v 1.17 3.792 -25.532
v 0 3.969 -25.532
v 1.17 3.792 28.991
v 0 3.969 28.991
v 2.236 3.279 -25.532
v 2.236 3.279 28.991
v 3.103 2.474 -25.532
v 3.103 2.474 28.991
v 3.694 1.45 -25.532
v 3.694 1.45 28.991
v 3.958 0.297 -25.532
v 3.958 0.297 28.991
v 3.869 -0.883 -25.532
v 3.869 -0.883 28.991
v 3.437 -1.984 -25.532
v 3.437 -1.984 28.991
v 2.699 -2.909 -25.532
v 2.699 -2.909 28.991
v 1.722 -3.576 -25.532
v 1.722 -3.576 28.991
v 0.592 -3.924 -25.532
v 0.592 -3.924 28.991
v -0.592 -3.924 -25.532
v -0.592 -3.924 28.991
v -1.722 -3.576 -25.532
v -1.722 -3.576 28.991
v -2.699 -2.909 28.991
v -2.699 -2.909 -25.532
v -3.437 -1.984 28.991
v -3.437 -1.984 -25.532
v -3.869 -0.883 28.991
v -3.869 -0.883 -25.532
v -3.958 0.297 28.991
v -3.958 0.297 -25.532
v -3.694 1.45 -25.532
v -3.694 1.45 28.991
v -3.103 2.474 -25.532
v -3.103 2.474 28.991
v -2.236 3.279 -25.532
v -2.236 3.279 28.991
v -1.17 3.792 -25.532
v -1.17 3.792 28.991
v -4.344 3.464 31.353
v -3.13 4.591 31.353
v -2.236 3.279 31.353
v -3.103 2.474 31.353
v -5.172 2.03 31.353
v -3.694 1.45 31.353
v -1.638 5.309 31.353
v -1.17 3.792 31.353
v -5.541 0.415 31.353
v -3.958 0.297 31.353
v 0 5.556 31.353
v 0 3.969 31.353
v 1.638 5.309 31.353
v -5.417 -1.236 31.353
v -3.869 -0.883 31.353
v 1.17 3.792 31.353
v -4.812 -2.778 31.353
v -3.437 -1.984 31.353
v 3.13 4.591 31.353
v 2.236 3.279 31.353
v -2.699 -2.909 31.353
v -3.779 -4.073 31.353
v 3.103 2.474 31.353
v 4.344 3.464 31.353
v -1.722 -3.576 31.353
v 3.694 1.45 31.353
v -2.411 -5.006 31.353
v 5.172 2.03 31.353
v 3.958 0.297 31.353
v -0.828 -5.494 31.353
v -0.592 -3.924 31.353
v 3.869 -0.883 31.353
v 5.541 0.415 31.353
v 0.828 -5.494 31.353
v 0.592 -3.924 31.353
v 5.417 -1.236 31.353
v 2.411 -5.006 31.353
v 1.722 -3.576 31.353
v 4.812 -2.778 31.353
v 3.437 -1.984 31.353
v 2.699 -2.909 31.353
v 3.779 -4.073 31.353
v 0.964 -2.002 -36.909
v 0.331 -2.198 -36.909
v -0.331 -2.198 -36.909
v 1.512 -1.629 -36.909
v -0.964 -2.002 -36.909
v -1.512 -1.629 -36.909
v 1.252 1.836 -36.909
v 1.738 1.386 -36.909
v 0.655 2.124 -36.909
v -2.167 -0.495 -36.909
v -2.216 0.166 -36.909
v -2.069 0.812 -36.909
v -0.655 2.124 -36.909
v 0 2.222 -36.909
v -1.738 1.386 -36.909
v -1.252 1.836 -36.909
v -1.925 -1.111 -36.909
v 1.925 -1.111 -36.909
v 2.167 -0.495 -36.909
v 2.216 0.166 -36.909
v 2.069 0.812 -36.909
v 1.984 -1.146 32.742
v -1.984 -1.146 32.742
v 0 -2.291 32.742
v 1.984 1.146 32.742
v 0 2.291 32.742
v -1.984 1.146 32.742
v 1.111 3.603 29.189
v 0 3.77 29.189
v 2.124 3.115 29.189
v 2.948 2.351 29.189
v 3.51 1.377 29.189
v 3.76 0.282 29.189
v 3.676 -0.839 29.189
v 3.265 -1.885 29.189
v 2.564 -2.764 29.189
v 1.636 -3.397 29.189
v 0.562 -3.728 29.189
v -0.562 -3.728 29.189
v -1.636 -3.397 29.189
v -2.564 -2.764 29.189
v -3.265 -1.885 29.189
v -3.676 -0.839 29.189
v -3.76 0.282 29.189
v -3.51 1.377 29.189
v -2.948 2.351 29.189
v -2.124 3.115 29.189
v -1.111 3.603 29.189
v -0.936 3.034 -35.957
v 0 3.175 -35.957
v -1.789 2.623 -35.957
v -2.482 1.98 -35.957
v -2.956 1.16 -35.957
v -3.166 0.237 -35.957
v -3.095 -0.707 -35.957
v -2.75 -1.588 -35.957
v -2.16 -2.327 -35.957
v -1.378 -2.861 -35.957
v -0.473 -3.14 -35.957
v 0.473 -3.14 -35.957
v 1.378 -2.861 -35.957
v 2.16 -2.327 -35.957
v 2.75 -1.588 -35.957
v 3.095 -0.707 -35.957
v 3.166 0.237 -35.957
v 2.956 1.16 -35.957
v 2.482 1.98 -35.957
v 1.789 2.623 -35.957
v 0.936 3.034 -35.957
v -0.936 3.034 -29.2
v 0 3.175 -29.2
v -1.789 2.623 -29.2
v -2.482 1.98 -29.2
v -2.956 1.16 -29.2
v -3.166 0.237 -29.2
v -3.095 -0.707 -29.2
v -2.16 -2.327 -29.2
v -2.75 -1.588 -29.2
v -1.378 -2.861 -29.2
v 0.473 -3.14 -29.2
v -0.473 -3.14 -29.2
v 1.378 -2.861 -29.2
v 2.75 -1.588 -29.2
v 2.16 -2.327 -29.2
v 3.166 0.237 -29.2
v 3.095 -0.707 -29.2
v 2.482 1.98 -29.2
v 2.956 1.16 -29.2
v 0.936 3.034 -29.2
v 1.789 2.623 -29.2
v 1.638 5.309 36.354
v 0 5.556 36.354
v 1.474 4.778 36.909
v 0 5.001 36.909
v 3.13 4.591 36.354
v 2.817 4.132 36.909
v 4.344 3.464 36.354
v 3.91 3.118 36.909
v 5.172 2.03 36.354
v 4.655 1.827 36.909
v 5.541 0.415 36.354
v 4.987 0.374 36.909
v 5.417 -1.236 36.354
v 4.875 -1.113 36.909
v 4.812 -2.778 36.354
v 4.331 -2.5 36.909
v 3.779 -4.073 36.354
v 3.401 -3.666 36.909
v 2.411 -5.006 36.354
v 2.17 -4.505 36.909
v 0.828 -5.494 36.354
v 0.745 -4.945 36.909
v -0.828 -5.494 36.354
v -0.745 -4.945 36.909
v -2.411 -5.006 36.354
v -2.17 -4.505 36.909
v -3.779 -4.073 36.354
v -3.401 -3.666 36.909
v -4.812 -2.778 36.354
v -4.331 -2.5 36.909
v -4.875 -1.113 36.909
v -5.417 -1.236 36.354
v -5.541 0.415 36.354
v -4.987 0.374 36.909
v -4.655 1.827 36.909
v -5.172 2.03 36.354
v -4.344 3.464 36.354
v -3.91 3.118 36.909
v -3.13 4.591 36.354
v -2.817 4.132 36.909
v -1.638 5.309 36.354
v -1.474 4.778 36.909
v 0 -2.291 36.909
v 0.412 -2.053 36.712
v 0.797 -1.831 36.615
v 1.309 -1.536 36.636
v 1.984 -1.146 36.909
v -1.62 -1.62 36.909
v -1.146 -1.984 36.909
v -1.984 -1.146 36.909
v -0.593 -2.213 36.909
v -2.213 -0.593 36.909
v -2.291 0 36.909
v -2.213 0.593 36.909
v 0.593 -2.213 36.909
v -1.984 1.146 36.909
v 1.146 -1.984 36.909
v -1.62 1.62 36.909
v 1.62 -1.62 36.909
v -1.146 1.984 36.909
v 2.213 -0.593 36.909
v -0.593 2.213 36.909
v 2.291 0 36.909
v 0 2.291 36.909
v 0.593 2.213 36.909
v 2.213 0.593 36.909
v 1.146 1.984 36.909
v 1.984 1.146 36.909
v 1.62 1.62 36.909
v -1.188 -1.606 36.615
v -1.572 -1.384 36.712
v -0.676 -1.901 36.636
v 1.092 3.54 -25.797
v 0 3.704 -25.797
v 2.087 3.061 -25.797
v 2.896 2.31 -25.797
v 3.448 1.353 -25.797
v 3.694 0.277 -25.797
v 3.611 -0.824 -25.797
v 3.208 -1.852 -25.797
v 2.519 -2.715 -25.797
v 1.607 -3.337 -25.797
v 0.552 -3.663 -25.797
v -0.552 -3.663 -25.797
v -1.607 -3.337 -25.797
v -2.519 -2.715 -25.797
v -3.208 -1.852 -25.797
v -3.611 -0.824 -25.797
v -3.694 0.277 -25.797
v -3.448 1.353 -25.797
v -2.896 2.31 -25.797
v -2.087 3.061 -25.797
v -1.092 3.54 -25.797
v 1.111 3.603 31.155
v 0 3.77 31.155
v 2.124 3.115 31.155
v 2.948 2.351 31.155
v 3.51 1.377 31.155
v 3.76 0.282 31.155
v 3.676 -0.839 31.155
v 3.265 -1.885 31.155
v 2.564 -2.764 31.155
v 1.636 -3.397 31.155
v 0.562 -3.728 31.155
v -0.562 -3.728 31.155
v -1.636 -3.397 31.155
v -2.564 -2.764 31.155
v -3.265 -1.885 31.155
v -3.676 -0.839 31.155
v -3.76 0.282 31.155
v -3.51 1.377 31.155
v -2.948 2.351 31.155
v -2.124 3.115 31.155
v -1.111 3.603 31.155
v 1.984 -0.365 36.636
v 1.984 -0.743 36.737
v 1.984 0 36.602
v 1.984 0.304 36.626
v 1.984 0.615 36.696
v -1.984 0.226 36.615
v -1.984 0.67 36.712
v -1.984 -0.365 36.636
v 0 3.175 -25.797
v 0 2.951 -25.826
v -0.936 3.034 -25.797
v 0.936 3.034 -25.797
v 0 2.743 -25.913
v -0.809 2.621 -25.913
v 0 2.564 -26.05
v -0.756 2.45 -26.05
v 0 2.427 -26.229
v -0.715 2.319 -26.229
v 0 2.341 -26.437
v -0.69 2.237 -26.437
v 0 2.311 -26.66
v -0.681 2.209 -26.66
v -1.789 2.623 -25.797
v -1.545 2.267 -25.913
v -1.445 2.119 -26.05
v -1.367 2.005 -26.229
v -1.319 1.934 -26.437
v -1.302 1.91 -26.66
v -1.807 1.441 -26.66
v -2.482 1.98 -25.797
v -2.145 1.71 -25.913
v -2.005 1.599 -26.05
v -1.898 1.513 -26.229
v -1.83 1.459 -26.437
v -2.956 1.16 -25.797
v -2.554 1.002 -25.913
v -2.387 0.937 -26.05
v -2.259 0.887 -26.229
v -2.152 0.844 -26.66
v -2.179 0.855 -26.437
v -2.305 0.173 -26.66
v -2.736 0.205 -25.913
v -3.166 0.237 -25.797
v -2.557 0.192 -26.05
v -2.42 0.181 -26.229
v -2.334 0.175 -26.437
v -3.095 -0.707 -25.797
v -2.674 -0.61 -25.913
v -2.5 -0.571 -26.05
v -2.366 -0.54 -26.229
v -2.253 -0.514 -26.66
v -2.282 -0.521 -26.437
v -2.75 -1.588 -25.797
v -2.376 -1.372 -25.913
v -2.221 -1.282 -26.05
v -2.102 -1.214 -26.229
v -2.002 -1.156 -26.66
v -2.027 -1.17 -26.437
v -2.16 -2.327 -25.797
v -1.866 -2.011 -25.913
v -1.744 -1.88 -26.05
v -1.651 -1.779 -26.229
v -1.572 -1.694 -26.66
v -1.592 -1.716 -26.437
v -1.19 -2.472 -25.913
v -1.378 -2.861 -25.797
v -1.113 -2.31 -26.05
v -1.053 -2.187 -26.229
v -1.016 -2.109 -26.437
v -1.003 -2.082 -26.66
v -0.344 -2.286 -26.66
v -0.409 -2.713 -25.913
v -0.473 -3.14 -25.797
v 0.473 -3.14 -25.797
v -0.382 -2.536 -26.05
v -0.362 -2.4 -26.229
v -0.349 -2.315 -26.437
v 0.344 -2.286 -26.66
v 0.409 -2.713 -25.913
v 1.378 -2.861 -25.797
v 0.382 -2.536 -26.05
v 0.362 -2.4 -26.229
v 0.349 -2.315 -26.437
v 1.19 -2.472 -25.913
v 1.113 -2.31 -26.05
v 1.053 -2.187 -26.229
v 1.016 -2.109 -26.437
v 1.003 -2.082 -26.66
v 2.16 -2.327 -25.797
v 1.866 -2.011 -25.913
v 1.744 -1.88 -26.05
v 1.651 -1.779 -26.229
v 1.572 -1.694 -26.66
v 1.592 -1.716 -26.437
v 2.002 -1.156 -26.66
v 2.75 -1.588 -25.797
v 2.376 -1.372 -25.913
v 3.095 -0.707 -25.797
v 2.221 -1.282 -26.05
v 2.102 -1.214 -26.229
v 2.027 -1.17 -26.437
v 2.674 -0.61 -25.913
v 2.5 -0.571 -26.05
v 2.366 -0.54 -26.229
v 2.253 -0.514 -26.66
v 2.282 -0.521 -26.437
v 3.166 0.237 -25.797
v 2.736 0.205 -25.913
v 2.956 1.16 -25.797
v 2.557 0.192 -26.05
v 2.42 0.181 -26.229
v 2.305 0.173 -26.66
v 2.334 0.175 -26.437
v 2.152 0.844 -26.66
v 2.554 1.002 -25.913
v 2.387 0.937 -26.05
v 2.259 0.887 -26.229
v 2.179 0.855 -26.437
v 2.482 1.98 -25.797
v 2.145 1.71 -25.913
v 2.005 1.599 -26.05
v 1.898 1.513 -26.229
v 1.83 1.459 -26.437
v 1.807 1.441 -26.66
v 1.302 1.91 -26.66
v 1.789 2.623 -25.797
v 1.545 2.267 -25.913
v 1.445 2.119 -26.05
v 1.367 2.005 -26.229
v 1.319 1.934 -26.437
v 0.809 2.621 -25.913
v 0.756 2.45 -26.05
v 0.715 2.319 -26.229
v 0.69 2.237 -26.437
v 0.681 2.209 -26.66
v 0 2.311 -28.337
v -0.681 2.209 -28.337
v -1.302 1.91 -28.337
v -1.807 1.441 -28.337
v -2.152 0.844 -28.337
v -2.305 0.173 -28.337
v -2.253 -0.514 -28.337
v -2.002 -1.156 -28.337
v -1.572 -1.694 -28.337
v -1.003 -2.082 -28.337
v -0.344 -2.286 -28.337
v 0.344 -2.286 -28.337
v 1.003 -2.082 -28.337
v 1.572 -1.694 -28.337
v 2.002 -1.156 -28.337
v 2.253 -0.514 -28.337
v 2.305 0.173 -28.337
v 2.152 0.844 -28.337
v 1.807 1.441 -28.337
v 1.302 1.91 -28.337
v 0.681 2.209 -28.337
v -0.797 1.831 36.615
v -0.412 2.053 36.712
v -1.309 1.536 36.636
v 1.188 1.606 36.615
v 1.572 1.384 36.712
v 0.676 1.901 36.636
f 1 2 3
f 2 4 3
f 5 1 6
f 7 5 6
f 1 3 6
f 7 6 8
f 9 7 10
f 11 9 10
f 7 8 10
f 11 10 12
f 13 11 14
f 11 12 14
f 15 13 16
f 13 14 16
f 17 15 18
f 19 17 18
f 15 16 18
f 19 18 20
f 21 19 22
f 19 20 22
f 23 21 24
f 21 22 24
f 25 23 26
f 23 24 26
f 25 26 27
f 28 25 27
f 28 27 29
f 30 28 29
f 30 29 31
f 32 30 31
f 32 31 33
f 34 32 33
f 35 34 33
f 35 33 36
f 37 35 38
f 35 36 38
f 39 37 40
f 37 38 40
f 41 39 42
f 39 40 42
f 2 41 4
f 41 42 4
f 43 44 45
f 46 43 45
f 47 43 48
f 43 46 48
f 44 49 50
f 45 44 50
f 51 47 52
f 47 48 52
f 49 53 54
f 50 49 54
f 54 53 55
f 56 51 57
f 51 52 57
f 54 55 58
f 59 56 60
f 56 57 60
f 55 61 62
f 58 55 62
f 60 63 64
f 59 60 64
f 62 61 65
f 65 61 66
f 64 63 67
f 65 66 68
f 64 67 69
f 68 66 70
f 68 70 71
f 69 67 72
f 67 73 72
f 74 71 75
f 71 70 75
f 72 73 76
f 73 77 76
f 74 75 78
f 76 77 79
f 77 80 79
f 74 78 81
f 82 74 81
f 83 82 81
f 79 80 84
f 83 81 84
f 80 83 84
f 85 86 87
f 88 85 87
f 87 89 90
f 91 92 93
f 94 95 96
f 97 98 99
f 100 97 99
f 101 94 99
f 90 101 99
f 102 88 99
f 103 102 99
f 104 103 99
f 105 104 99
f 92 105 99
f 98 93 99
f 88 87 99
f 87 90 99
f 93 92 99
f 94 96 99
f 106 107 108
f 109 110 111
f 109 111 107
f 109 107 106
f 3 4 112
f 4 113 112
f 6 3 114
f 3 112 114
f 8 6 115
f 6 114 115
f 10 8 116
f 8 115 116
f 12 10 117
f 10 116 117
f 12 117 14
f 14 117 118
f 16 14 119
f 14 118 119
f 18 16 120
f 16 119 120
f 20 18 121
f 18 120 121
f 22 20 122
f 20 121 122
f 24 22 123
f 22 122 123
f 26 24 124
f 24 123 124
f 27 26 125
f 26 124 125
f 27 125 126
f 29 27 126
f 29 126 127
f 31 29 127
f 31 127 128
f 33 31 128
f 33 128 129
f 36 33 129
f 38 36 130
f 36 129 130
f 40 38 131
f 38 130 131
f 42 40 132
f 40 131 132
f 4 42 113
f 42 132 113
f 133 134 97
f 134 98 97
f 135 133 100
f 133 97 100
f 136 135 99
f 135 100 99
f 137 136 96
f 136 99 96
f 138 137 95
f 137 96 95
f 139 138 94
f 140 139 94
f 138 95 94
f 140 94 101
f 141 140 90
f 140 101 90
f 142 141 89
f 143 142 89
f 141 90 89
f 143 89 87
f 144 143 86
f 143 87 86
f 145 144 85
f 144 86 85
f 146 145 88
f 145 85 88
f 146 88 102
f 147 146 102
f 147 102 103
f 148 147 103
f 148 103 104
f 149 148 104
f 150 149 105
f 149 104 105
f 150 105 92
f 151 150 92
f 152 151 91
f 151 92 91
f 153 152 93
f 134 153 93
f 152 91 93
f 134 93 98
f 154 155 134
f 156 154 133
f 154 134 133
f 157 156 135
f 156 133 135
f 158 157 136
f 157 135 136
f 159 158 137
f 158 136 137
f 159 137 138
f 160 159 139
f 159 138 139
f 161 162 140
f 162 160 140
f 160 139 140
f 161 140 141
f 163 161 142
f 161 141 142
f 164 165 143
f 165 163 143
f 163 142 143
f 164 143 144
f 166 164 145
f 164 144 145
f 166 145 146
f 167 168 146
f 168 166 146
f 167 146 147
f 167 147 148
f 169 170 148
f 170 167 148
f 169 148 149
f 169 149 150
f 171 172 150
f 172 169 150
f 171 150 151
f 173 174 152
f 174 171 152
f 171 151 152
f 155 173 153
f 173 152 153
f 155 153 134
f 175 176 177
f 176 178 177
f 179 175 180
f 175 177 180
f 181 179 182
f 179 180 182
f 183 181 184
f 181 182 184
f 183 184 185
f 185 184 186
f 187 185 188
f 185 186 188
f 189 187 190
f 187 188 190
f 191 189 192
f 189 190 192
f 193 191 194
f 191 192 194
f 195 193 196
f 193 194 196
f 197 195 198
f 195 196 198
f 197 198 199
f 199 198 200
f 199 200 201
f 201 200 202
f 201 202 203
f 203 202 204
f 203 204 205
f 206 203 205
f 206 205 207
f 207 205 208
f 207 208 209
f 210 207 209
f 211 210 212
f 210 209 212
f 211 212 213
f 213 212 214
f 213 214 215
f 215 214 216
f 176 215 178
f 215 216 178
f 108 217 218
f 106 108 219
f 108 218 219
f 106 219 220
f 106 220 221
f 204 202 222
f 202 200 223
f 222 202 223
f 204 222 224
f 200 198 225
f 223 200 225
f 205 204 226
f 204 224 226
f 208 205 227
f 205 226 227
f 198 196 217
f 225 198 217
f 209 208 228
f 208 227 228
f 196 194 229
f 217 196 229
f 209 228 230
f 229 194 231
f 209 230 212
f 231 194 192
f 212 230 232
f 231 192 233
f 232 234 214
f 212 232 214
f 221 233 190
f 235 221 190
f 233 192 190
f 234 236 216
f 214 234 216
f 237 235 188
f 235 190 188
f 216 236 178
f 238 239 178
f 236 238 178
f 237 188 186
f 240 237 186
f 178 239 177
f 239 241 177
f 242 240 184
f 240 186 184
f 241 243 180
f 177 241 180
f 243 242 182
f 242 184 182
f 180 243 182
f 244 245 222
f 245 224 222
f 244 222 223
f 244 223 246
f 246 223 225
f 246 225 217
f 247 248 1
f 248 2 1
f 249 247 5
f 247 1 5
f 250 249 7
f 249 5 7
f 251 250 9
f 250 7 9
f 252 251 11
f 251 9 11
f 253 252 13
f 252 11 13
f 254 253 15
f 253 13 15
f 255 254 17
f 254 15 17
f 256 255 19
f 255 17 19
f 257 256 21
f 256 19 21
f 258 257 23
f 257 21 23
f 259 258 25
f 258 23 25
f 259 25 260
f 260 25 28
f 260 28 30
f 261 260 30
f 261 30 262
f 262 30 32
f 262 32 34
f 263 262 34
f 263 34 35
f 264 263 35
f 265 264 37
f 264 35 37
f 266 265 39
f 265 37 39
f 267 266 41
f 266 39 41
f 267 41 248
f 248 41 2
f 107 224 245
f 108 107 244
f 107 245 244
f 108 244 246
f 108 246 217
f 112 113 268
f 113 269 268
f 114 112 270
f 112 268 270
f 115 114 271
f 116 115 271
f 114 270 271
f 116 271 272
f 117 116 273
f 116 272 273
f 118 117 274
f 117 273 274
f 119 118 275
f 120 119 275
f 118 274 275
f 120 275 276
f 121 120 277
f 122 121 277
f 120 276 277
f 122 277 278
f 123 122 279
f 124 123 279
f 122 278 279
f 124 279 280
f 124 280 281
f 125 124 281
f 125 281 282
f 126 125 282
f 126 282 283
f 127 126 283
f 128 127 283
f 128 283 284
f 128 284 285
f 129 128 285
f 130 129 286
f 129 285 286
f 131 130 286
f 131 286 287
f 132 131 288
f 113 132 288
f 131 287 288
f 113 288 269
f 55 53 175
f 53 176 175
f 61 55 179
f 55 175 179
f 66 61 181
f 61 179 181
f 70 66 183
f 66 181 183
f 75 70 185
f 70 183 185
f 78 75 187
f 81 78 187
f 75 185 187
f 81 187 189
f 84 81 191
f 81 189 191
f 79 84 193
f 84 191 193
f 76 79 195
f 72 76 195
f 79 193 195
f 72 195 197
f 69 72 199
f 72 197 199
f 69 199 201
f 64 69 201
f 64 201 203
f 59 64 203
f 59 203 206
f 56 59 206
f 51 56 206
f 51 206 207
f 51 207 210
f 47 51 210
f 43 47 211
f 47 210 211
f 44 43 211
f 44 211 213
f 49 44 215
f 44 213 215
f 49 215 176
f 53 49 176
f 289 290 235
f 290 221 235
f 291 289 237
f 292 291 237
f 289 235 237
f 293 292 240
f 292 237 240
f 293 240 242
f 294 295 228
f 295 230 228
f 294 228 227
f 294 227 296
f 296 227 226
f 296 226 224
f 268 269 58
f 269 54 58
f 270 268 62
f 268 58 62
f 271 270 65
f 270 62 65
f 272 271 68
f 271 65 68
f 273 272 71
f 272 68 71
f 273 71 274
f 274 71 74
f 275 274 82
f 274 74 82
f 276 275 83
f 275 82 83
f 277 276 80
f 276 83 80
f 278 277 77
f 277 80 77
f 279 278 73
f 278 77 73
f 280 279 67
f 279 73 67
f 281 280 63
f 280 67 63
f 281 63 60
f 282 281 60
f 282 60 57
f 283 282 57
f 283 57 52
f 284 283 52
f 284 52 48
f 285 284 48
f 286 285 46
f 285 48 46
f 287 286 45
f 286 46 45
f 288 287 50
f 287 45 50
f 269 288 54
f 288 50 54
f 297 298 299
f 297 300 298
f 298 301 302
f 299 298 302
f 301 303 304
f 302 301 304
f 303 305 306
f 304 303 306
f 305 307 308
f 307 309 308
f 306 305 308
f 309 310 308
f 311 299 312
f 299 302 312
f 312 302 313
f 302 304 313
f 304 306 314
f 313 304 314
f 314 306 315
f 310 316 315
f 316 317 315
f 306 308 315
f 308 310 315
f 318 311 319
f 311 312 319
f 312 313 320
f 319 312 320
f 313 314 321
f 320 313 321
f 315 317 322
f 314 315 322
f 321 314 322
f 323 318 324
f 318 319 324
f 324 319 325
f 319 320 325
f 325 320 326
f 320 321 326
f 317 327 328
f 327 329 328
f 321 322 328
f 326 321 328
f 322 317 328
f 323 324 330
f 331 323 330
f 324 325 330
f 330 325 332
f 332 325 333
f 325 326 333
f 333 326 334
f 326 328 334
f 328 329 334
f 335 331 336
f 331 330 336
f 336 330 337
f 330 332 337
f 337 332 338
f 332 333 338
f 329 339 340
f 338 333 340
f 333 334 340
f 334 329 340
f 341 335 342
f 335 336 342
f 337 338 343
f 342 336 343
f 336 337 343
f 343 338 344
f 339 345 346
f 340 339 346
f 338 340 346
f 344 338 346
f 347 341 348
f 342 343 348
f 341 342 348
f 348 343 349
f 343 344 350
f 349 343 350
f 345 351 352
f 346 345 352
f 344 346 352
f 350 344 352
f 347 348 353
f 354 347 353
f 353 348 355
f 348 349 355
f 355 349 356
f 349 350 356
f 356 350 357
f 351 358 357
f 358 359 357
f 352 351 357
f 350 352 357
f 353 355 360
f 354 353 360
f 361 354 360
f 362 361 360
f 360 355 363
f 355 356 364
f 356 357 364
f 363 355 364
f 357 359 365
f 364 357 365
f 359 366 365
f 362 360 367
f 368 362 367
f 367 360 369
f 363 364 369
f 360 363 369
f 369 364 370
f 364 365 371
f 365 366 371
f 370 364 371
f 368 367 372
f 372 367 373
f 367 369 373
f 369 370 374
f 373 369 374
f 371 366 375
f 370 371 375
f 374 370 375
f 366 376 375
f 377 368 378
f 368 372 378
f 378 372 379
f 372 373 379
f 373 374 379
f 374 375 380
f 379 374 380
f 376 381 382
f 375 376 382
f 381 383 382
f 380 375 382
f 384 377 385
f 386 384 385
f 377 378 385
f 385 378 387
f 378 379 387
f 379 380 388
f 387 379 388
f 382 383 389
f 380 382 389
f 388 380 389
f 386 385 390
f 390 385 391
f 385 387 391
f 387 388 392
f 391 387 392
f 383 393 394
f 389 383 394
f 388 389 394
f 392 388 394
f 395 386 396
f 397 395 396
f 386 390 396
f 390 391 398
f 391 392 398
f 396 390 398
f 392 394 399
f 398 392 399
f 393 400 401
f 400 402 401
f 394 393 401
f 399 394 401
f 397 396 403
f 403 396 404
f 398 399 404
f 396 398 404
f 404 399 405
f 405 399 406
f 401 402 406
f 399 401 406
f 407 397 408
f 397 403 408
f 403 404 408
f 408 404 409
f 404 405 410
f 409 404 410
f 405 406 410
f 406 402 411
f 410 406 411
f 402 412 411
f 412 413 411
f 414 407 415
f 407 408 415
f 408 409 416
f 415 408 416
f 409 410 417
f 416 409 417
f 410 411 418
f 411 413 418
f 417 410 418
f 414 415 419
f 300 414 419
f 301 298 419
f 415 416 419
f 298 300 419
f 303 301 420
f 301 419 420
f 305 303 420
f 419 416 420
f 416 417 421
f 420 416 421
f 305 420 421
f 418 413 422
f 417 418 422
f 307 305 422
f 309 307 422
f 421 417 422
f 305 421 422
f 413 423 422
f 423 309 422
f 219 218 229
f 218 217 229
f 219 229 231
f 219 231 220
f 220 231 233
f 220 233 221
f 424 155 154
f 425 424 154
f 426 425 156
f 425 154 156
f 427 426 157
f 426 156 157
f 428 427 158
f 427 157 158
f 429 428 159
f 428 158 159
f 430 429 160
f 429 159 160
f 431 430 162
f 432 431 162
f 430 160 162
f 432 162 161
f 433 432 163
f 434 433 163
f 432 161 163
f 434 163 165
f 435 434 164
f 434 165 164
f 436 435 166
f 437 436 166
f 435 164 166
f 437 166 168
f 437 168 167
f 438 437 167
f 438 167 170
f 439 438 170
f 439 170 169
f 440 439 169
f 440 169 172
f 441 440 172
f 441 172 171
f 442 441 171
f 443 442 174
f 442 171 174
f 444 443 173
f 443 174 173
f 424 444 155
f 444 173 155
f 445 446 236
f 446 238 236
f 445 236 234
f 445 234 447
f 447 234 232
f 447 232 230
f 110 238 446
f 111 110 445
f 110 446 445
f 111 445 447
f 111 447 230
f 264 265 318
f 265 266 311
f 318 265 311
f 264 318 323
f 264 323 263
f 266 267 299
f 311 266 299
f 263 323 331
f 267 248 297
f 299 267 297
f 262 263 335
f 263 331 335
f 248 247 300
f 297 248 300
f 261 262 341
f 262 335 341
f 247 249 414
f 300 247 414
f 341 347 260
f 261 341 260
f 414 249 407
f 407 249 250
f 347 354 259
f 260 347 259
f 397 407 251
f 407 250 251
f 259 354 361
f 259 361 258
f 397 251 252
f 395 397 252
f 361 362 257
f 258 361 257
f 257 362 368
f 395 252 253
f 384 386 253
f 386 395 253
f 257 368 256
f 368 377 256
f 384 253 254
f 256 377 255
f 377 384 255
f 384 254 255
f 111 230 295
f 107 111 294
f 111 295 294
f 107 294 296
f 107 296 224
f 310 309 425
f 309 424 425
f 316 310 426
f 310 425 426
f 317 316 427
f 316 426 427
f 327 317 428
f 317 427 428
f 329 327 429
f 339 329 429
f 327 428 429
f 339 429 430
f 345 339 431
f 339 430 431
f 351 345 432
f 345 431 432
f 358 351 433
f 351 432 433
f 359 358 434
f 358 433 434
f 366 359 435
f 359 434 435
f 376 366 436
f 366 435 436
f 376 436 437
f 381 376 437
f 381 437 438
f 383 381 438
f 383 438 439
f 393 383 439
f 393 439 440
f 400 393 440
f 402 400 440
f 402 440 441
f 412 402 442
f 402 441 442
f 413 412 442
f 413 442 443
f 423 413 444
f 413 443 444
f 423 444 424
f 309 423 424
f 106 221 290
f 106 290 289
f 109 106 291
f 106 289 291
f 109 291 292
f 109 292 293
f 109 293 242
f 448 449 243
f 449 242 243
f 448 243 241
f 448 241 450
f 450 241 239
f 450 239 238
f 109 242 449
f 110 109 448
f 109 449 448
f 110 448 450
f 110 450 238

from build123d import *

# Parameters (mm, degrees)
CUT_EXTRUDE1_DEPTH = 4.1671875


with BuildPart() as part:
    # Sketch4 → Revolve1 (revolve)
    with BuildSketch(Plane(origin=(0, 0, 0), x_dir=(0, 0, -1), z_dir=(1, 0, 0))):
        Polygon((-31.353125, 5.55625), (-36.35375, 5.55625), (-36.909375, 5.000625), (-36.909375, 0), (25.796875, 0), (25.796875, 3.704166667), (25.532291667, 3.96875), (-28.990925, 3.96875), (-29.1893625, 3.7703125), (-31.1546875, 3.7703125), (-31.353125, 3.96875), align=None)
    revolve(axis=Axis((0, 0, 36.909375), (0, 0, -1)))

    # Sketch5 → Cut-Extrude1 (cut)
    with BuildSketch(Plane.XY.offset(36.909375)):
        Polygon((1.984375, 1.14567944), (0, 2.291358881), (-1.984375, 1.14567944), (-1.984375, -1.14567944), (0, -2.291358881), (1.984375, -1.14567944), align=None)
    extrude(amount=-CUT_EXTRUDE1_DEPTH, mode=Mode.SUBTRACT)

    # Cut-Extrude4 cone 1 section (through the dimple's axis) → Cut-Extrude4 (revolve, cut)
    with BuildSketch(Plane(origin=(0, 0, 36.909375), x_dir=(0, -1, 0), z_dir=(1, 0, 0))):
        Polygon((0, 0), (2.291358881, 0), (0, 2.291358881), align=None)
    revolve(axis=Axis((0, 0, 36.909375), (0, 0, -1)), mode=Mode.SUBTRACT)

    # Sketch7 → Revolve2 (revolve)
    with BuildSketch(Plane(origin=(0, 0, 0), x_dir=(0, 0, -1), z_dir=(1, 0, 0))):
        Polygon((25.796875, 3.175), (35.956875, 3.175), (36.909375, 2.2225), (36.909375, 0), (25.796875, 0), align=None)
    revolve(axis=Axis((0, 0, -36.909375), (0, 0, 1)))

    # Sketch10 → Cut-Revolve1 (revolve, cut)
    with BuildSketch(Plane(origin=(0, 0, 0), x_dir=(0, 0, -1), z_dir=(1, 0, 0))):
        with BuildLine():
            Line((26.660475, 2.3114), (28.336875, 2.3114))
            Line((28.336875, 2.3114), (29.994225, 3.96875))
            Line((29.994225, 3.96875), (25.796875, 3.96875))
            Line((25.796875, 3.96875), (25.796875, 3.175))
            ThreePointArc((25.796875, 3.175), (26.049817584, 2.564342584), (26.660475, 2.3114))
        make_face()
    revolve(axis=Axis((0, 0, -36.909375), (0, 0, 1)), mode=Mode.SUBTRACT)


solid = part.part
